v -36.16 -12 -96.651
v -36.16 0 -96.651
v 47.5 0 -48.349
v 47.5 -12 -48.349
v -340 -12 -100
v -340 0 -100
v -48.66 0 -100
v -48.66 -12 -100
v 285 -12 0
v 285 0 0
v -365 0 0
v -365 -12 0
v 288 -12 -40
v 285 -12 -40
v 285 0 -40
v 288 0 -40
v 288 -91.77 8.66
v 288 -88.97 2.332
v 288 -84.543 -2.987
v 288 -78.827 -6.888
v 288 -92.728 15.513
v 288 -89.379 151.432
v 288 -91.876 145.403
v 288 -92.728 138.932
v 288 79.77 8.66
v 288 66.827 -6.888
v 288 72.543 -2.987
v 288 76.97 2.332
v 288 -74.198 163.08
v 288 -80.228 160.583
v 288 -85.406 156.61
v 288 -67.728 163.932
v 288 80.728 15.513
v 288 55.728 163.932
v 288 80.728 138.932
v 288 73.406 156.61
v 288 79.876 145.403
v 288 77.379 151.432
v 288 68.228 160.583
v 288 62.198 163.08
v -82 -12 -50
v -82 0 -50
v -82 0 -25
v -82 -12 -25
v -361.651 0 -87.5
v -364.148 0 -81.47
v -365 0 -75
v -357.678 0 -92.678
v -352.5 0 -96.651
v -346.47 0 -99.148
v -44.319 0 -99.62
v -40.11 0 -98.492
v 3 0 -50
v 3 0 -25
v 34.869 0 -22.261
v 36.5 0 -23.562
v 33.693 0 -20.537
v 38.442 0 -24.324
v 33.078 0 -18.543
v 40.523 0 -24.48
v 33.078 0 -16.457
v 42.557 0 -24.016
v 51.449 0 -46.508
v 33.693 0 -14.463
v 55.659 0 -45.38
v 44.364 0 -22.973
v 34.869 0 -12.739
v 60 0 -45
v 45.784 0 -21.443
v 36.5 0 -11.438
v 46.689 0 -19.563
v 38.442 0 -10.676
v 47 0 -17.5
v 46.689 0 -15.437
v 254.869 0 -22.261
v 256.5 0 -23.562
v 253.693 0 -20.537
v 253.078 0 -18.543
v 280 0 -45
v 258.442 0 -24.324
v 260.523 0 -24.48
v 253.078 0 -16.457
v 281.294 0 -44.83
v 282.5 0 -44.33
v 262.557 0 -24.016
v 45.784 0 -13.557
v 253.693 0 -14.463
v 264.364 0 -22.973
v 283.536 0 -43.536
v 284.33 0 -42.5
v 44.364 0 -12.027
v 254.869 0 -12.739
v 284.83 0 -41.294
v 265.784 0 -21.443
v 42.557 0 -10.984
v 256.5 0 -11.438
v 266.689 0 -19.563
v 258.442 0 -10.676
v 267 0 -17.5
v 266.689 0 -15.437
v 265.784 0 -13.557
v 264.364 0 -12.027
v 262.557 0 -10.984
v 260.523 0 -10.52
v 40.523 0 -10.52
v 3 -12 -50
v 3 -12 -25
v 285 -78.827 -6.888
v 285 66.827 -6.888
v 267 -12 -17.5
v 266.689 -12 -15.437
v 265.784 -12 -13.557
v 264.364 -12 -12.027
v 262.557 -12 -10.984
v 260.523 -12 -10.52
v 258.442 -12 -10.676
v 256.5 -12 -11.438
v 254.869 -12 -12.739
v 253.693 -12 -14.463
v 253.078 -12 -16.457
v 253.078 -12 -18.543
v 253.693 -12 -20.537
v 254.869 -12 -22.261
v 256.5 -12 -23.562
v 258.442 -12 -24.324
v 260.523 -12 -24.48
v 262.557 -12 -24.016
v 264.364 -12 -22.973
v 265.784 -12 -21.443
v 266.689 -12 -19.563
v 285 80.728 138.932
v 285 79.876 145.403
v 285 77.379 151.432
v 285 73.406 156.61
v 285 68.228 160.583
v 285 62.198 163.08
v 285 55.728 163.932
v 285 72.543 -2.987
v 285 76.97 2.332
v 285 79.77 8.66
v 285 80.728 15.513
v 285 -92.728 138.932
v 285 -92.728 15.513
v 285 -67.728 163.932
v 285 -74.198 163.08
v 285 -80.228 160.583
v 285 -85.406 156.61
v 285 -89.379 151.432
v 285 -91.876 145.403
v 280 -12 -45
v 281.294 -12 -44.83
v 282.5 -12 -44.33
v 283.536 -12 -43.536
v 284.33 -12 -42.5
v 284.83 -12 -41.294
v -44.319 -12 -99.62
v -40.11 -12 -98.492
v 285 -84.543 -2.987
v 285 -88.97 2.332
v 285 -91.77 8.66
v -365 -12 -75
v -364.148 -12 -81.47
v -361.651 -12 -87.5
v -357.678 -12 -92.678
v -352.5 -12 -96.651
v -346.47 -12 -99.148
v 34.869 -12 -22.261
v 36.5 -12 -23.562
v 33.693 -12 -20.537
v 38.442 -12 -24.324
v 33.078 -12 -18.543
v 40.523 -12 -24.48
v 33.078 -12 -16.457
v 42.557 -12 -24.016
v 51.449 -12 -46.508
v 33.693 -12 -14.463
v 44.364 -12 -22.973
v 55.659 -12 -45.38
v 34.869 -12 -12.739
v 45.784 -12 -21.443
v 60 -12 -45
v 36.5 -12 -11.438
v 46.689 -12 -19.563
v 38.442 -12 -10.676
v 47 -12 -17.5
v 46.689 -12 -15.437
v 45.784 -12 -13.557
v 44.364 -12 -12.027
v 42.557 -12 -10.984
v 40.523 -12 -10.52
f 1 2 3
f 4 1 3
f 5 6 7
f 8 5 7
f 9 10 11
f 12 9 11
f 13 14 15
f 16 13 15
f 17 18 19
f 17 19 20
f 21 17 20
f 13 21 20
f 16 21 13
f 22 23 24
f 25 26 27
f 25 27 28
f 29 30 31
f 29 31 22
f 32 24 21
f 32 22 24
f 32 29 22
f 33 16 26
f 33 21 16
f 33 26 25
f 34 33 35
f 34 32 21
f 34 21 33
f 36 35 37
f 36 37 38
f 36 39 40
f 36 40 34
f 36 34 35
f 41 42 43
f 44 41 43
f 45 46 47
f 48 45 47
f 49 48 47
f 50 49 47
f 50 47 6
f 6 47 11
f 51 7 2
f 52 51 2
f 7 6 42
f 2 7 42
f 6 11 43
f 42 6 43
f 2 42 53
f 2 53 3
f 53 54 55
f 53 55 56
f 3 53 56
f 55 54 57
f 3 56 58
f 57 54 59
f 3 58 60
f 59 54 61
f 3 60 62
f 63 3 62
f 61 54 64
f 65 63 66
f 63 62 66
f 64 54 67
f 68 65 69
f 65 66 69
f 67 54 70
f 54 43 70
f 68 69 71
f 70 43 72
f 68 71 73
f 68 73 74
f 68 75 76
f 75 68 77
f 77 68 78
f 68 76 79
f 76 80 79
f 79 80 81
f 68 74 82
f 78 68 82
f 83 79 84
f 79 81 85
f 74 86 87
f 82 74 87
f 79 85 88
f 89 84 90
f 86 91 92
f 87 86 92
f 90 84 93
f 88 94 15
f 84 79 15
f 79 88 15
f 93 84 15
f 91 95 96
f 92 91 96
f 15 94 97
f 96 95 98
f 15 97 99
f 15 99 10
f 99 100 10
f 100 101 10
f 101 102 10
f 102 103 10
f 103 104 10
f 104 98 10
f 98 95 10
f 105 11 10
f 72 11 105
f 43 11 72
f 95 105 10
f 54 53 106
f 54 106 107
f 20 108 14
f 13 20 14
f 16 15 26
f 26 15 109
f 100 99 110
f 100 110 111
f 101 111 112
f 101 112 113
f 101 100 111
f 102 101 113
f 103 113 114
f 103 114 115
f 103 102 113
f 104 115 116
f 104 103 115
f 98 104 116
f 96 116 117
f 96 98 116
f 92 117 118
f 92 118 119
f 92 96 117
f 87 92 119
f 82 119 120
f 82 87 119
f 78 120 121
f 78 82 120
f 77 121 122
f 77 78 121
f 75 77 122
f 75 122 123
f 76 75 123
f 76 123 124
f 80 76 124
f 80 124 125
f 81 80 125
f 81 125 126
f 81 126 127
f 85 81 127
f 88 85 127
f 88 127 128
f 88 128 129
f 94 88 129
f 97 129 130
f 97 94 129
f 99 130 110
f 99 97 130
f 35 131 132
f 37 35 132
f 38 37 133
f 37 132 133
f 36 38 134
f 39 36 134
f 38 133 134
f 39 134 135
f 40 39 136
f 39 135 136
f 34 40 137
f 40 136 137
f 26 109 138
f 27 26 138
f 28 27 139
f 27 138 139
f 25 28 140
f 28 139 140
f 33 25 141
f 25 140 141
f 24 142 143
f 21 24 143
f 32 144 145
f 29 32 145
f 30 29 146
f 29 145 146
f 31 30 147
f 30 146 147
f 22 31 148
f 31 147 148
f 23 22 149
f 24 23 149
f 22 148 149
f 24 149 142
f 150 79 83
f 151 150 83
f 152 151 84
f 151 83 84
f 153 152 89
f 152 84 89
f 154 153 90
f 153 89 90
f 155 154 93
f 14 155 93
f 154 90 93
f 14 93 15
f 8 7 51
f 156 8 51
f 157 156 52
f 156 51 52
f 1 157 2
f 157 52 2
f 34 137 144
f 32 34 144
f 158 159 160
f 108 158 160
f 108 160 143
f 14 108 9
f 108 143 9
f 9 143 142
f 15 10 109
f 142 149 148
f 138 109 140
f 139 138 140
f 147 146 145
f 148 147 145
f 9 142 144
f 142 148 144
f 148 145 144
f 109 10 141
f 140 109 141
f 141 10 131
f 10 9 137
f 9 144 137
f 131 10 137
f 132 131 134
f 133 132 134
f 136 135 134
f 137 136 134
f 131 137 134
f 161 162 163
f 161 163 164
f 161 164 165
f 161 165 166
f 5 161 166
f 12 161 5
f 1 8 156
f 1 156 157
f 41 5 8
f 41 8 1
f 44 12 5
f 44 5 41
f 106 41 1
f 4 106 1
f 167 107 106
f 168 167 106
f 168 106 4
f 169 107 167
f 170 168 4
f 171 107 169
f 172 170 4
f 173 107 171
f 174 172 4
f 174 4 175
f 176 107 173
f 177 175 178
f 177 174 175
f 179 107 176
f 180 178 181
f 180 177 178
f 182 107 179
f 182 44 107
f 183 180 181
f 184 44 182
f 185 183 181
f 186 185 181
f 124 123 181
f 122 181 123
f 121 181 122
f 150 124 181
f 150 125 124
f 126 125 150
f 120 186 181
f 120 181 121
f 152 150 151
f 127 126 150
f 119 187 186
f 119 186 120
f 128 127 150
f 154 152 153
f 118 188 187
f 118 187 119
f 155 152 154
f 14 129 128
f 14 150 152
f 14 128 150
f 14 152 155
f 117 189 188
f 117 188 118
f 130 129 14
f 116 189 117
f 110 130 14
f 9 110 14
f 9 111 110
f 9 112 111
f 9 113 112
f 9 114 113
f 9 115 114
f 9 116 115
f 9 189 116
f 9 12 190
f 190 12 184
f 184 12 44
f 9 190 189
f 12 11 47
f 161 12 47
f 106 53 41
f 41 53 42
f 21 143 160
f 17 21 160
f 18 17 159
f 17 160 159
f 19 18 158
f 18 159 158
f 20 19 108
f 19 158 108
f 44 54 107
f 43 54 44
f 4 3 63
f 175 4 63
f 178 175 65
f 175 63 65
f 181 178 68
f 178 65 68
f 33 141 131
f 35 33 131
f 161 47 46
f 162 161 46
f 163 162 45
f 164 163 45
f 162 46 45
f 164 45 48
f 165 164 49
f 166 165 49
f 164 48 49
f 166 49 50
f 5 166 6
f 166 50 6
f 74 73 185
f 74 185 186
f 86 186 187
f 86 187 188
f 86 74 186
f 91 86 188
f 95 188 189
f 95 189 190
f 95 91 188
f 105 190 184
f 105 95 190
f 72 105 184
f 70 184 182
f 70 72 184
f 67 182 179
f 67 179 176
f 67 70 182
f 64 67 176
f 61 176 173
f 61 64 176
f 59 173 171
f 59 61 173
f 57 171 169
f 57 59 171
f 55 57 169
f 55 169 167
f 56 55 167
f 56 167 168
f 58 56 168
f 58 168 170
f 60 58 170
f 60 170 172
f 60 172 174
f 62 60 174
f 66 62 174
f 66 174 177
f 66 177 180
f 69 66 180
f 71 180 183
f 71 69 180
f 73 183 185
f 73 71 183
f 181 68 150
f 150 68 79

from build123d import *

# Parameters (mm, degrees)
F0_R     = 7
F1_DEPTH = 12
F2_W     = 85
F2_H     = 25
F3_DEPTH = 25
F5_DEPTH = 3


with BuildPart() as f1:
    # F0 (on Front) → F1 (new body)
    with BuildSketch(Plane.XZ):
        with BuildLine():
            Line((285, 0), (0, 0))
            Line((0, 0), (-365, 0))
            Line((-365, 0), (-365, -75))
            ThreePointArc((-365, -75), (-357.67767, -92.67767), (-340, -100))
            Line((-340, -100), (-48.660254, -100))
            ThreePointArc((-48.660254, -100), (-42.189778, -99.148146), (-36.160254, -96.650635))
            Line((-36.160254, -96.650635), (47.5, -48.349365))
            ThreePointArc((47.5, -48.349365), (53.529524, -45.851854), (60, -45))
            Line((60, -45), (280, -45))
            ThreePointArc((280, -45), (283.535534, -43.535534), (285, -40))
            Line((285, -40), (285, 0))
        make_face()
        with Locations((40, -17.5)):
            Circle(F0_R, mode=Mode.SUBTRACT)
        with Locations((260, -17.5)):
            Circle(F0_R, mode=Mode.SUBTRACT)
    extrude(amount=F1_DEPTH)

    # F2 (on face) → F3 (cut)
    with BuildSketch(Plane(origin=(0, 0, 0), x_dir=(-1, 0, 0), z_dir=(0, 1, 0))):
        with Locations((39.5, -37.5)):
            Rectangle(F2_W, F2_H)
    extrude(amount=-F3_DEPTH, mode=Mode.SUBTRACT)

    # F4 (on face) → F5 (join)
    with BuildSketch(Plane.YZ.offset(285)):
        with BuildLine():
            Line((-12, -40), (-6, -40))
            Line((-6, -40), (0, -40))
            Line((0, -40), (66.827433, -6.887593))
            ThreePointArc((66.827433, -6.887593), (76.970455, 2.331662), (80.727967, 15.513341))
            Line((80.727967, 15.513341), (80.727967, 138.932179))
            ThreePointArc((80.727967, 138.932179), (73.405636, 156.609848), (55.727967, 163.932179))
            Line((55.727967, 163.932179), (0, 163.932179))
            Line((0, 163.932179), (-12, 163.932179))
            Line((-12, 163.932179), (-67.727967, 163.932179))
            ThreePointArc((-67.727967, 163.932179), (-85.405636, 156.609848), (-92.727967, 138.932179))
            Line((-92.727967, 138.932179), (-92.727967, 15.513341))
            ThreePointArc((-92.727967, 15.513341), (-88.970455, 2.331662), (-78.827433, -6.887593))
            Line((-78.827433, -6.887593), (-12, -40))
        make_face()
    extrude(amount=F5_DEPTH)


solid = f1.part
